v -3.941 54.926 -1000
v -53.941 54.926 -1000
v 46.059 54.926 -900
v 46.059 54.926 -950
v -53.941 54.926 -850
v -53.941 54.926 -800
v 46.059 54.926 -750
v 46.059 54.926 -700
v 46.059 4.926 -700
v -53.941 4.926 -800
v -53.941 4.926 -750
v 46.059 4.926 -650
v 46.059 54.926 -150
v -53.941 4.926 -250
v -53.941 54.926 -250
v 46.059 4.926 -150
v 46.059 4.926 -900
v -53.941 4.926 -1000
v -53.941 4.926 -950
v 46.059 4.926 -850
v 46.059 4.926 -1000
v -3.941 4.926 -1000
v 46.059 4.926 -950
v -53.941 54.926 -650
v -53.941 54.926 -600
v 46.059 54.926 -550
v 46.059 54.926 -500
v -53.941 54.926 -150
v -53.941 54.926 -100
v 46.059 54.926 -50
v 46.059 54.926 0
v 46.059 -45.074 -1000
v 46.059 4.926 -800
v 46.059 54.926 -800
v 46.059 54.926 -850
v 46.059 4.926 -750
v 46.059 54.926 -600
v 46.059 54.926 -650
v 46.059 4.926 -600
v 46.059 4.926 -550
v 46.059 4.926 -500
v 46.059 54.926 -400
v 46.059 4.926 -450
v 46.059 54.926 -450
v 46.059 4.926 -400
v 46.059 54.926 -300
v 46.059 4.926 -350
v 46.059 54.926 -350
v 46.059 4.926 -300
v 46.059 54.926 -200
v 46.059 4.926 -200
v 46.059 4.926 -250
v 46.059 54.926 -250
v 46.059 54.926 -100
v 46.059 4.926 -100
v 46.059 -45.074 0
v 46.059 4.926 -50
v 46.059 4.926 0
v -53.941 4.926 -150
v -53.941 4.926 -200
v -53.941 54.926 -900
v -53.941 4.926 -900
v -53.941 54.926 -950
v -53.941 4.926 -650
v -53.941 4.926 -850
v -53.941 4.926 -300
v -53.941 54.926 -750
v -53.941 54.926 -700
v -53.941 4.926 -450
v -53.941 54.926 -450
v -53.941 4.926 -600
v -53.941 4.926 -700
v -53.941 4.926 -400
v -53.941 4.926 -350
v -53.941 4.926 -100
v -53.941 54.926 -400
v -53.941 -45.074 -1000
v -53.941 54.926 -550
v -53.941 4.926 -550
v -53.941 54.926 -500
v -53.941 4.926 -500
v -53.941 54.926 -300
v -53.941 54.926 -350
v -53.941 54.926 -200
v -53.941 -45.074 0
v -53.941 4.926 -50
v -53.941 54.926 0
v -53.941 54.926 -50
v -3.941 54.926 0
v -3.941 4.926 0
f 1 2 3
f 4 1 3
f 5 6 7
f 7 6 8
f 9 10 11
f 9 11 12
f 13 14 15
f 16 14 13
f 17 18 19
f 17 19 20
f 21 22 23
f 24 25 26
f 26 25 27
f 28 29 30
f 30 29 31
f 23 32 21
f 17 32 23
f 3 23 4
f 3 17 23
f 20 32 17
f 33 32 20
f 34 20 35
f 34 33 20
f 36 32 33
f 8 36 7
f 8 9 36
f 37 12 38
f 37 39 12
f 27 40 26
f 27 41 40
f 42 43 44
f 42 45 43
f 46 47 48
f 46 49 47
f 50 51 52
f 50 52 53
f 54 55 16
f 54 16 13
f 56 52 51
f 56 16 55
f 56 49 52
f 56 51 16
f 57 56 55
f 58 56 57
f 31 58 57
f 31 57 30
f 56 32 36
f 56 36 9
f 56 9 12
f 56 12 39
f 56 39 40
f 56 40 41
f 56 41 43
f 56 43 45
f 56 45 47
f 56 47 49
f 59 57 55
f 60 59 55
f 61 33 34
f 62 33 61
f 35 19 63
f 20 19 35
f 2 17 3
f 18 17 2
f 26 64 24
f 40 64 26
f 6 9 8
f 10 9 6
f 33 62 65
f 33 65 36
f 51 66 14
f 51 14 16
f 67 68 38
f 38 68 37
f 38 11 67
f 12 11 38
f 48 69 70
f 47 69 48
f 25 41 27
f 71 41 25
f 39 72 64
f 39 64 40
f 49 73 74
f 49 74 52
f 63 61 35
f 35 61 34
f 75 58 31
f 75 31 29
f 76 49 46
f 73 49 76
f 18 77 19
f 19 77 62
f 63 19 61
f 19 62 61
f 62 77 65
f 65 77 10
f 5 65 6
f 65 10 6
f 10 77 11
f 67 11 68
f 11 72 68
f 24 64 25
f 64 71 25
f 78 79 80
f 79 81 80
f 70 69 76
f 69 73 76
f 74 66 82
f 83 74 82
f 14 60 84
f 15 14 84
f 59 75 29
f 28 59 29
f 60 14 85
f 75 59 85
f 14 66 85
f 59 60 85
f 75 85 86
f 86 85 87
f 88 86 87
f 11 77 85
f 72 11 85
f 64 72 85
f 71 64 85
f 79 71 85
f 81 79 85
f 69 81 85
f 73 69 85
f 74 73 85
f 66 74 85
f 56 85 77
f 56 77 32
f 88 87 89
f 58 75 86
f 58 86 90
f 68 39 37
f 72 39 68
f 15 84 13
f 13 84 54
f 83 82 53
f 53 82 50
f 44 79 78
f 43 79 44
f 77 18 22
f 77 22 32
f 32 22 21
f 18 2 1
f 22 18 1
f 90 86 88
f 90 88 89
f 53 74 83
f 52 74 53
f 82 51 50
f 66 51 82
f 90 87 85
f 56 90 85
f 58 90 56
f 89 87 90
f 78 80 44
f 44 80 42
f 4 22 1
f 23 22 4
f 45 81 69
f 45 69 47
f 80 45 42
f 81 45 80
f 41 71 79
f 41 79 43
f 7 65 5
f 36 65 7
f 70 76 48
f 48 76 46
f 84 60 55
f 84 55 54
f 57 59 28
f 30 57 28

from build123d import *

# Parameters (mm, degrees)
SKETCH1_W            = 100
SKETCH1_H            = 100
BOSS_EXTRUDE1_DEPTH  = 1000
SKETCH6_W            = 50
SKETCH6_H            = 50
CUT_EXTRUDE1_DEPTH   = 1000
LPATTERN1_COUNT      = 10
LPATTERN1_PITCH      = 100
LPATTERN1_COUNT_DIR2 = 10
LPATTERN1_PITCH_DIR2 = 100


with BuildPart() as part:
    # Sketch1 → Boss-Extrude1 (new body)
    with BuildSketch(Plane.XY):
        with Locations((-3.9408867, 4.926108374)):
            Rectangle(SKETCH1_W, SKETCH1_H)
    extrude(amount=-BOSS_EXTRUDE1_DEPTH)

    # Sketch6 → Cut-Extrude1 (cut, along a direction that is not the sketch's normal)
    with BuildSketch(Plane(origin=(46.0591133, 0, 0), x_dir=(0, 0, -1), z_dir=(1, 0, 0))):
        with Locations((75, 29.926108374)):
            Rectangle(SKETCH6_W, SKETCH6_H)
    cut_extrude1 = extrude(amount=-CUT_EXTRUDE1_DEPTH, dir=(0.7071067811865516, 0, 0.7071067811865435), mode=Mode.SUBTRACT)

    # LPattern1: Cut-Extrude1 10 × 10
    with Locations(*[Vector(0, 0, -1) * (i * LPATTERN1_PITCH) + Vector(0, 0, 1) * (j * LPATTERN1_PITCH_DIR2) for i in range(LPATTERN1_COUNT) for j in range(LPATTERN1_COUNT_DIR2) if (i, j) != (0, 0)]):
        add(cut_extrude1, mode=Mode.SUBTRACT)


solid = part.part
